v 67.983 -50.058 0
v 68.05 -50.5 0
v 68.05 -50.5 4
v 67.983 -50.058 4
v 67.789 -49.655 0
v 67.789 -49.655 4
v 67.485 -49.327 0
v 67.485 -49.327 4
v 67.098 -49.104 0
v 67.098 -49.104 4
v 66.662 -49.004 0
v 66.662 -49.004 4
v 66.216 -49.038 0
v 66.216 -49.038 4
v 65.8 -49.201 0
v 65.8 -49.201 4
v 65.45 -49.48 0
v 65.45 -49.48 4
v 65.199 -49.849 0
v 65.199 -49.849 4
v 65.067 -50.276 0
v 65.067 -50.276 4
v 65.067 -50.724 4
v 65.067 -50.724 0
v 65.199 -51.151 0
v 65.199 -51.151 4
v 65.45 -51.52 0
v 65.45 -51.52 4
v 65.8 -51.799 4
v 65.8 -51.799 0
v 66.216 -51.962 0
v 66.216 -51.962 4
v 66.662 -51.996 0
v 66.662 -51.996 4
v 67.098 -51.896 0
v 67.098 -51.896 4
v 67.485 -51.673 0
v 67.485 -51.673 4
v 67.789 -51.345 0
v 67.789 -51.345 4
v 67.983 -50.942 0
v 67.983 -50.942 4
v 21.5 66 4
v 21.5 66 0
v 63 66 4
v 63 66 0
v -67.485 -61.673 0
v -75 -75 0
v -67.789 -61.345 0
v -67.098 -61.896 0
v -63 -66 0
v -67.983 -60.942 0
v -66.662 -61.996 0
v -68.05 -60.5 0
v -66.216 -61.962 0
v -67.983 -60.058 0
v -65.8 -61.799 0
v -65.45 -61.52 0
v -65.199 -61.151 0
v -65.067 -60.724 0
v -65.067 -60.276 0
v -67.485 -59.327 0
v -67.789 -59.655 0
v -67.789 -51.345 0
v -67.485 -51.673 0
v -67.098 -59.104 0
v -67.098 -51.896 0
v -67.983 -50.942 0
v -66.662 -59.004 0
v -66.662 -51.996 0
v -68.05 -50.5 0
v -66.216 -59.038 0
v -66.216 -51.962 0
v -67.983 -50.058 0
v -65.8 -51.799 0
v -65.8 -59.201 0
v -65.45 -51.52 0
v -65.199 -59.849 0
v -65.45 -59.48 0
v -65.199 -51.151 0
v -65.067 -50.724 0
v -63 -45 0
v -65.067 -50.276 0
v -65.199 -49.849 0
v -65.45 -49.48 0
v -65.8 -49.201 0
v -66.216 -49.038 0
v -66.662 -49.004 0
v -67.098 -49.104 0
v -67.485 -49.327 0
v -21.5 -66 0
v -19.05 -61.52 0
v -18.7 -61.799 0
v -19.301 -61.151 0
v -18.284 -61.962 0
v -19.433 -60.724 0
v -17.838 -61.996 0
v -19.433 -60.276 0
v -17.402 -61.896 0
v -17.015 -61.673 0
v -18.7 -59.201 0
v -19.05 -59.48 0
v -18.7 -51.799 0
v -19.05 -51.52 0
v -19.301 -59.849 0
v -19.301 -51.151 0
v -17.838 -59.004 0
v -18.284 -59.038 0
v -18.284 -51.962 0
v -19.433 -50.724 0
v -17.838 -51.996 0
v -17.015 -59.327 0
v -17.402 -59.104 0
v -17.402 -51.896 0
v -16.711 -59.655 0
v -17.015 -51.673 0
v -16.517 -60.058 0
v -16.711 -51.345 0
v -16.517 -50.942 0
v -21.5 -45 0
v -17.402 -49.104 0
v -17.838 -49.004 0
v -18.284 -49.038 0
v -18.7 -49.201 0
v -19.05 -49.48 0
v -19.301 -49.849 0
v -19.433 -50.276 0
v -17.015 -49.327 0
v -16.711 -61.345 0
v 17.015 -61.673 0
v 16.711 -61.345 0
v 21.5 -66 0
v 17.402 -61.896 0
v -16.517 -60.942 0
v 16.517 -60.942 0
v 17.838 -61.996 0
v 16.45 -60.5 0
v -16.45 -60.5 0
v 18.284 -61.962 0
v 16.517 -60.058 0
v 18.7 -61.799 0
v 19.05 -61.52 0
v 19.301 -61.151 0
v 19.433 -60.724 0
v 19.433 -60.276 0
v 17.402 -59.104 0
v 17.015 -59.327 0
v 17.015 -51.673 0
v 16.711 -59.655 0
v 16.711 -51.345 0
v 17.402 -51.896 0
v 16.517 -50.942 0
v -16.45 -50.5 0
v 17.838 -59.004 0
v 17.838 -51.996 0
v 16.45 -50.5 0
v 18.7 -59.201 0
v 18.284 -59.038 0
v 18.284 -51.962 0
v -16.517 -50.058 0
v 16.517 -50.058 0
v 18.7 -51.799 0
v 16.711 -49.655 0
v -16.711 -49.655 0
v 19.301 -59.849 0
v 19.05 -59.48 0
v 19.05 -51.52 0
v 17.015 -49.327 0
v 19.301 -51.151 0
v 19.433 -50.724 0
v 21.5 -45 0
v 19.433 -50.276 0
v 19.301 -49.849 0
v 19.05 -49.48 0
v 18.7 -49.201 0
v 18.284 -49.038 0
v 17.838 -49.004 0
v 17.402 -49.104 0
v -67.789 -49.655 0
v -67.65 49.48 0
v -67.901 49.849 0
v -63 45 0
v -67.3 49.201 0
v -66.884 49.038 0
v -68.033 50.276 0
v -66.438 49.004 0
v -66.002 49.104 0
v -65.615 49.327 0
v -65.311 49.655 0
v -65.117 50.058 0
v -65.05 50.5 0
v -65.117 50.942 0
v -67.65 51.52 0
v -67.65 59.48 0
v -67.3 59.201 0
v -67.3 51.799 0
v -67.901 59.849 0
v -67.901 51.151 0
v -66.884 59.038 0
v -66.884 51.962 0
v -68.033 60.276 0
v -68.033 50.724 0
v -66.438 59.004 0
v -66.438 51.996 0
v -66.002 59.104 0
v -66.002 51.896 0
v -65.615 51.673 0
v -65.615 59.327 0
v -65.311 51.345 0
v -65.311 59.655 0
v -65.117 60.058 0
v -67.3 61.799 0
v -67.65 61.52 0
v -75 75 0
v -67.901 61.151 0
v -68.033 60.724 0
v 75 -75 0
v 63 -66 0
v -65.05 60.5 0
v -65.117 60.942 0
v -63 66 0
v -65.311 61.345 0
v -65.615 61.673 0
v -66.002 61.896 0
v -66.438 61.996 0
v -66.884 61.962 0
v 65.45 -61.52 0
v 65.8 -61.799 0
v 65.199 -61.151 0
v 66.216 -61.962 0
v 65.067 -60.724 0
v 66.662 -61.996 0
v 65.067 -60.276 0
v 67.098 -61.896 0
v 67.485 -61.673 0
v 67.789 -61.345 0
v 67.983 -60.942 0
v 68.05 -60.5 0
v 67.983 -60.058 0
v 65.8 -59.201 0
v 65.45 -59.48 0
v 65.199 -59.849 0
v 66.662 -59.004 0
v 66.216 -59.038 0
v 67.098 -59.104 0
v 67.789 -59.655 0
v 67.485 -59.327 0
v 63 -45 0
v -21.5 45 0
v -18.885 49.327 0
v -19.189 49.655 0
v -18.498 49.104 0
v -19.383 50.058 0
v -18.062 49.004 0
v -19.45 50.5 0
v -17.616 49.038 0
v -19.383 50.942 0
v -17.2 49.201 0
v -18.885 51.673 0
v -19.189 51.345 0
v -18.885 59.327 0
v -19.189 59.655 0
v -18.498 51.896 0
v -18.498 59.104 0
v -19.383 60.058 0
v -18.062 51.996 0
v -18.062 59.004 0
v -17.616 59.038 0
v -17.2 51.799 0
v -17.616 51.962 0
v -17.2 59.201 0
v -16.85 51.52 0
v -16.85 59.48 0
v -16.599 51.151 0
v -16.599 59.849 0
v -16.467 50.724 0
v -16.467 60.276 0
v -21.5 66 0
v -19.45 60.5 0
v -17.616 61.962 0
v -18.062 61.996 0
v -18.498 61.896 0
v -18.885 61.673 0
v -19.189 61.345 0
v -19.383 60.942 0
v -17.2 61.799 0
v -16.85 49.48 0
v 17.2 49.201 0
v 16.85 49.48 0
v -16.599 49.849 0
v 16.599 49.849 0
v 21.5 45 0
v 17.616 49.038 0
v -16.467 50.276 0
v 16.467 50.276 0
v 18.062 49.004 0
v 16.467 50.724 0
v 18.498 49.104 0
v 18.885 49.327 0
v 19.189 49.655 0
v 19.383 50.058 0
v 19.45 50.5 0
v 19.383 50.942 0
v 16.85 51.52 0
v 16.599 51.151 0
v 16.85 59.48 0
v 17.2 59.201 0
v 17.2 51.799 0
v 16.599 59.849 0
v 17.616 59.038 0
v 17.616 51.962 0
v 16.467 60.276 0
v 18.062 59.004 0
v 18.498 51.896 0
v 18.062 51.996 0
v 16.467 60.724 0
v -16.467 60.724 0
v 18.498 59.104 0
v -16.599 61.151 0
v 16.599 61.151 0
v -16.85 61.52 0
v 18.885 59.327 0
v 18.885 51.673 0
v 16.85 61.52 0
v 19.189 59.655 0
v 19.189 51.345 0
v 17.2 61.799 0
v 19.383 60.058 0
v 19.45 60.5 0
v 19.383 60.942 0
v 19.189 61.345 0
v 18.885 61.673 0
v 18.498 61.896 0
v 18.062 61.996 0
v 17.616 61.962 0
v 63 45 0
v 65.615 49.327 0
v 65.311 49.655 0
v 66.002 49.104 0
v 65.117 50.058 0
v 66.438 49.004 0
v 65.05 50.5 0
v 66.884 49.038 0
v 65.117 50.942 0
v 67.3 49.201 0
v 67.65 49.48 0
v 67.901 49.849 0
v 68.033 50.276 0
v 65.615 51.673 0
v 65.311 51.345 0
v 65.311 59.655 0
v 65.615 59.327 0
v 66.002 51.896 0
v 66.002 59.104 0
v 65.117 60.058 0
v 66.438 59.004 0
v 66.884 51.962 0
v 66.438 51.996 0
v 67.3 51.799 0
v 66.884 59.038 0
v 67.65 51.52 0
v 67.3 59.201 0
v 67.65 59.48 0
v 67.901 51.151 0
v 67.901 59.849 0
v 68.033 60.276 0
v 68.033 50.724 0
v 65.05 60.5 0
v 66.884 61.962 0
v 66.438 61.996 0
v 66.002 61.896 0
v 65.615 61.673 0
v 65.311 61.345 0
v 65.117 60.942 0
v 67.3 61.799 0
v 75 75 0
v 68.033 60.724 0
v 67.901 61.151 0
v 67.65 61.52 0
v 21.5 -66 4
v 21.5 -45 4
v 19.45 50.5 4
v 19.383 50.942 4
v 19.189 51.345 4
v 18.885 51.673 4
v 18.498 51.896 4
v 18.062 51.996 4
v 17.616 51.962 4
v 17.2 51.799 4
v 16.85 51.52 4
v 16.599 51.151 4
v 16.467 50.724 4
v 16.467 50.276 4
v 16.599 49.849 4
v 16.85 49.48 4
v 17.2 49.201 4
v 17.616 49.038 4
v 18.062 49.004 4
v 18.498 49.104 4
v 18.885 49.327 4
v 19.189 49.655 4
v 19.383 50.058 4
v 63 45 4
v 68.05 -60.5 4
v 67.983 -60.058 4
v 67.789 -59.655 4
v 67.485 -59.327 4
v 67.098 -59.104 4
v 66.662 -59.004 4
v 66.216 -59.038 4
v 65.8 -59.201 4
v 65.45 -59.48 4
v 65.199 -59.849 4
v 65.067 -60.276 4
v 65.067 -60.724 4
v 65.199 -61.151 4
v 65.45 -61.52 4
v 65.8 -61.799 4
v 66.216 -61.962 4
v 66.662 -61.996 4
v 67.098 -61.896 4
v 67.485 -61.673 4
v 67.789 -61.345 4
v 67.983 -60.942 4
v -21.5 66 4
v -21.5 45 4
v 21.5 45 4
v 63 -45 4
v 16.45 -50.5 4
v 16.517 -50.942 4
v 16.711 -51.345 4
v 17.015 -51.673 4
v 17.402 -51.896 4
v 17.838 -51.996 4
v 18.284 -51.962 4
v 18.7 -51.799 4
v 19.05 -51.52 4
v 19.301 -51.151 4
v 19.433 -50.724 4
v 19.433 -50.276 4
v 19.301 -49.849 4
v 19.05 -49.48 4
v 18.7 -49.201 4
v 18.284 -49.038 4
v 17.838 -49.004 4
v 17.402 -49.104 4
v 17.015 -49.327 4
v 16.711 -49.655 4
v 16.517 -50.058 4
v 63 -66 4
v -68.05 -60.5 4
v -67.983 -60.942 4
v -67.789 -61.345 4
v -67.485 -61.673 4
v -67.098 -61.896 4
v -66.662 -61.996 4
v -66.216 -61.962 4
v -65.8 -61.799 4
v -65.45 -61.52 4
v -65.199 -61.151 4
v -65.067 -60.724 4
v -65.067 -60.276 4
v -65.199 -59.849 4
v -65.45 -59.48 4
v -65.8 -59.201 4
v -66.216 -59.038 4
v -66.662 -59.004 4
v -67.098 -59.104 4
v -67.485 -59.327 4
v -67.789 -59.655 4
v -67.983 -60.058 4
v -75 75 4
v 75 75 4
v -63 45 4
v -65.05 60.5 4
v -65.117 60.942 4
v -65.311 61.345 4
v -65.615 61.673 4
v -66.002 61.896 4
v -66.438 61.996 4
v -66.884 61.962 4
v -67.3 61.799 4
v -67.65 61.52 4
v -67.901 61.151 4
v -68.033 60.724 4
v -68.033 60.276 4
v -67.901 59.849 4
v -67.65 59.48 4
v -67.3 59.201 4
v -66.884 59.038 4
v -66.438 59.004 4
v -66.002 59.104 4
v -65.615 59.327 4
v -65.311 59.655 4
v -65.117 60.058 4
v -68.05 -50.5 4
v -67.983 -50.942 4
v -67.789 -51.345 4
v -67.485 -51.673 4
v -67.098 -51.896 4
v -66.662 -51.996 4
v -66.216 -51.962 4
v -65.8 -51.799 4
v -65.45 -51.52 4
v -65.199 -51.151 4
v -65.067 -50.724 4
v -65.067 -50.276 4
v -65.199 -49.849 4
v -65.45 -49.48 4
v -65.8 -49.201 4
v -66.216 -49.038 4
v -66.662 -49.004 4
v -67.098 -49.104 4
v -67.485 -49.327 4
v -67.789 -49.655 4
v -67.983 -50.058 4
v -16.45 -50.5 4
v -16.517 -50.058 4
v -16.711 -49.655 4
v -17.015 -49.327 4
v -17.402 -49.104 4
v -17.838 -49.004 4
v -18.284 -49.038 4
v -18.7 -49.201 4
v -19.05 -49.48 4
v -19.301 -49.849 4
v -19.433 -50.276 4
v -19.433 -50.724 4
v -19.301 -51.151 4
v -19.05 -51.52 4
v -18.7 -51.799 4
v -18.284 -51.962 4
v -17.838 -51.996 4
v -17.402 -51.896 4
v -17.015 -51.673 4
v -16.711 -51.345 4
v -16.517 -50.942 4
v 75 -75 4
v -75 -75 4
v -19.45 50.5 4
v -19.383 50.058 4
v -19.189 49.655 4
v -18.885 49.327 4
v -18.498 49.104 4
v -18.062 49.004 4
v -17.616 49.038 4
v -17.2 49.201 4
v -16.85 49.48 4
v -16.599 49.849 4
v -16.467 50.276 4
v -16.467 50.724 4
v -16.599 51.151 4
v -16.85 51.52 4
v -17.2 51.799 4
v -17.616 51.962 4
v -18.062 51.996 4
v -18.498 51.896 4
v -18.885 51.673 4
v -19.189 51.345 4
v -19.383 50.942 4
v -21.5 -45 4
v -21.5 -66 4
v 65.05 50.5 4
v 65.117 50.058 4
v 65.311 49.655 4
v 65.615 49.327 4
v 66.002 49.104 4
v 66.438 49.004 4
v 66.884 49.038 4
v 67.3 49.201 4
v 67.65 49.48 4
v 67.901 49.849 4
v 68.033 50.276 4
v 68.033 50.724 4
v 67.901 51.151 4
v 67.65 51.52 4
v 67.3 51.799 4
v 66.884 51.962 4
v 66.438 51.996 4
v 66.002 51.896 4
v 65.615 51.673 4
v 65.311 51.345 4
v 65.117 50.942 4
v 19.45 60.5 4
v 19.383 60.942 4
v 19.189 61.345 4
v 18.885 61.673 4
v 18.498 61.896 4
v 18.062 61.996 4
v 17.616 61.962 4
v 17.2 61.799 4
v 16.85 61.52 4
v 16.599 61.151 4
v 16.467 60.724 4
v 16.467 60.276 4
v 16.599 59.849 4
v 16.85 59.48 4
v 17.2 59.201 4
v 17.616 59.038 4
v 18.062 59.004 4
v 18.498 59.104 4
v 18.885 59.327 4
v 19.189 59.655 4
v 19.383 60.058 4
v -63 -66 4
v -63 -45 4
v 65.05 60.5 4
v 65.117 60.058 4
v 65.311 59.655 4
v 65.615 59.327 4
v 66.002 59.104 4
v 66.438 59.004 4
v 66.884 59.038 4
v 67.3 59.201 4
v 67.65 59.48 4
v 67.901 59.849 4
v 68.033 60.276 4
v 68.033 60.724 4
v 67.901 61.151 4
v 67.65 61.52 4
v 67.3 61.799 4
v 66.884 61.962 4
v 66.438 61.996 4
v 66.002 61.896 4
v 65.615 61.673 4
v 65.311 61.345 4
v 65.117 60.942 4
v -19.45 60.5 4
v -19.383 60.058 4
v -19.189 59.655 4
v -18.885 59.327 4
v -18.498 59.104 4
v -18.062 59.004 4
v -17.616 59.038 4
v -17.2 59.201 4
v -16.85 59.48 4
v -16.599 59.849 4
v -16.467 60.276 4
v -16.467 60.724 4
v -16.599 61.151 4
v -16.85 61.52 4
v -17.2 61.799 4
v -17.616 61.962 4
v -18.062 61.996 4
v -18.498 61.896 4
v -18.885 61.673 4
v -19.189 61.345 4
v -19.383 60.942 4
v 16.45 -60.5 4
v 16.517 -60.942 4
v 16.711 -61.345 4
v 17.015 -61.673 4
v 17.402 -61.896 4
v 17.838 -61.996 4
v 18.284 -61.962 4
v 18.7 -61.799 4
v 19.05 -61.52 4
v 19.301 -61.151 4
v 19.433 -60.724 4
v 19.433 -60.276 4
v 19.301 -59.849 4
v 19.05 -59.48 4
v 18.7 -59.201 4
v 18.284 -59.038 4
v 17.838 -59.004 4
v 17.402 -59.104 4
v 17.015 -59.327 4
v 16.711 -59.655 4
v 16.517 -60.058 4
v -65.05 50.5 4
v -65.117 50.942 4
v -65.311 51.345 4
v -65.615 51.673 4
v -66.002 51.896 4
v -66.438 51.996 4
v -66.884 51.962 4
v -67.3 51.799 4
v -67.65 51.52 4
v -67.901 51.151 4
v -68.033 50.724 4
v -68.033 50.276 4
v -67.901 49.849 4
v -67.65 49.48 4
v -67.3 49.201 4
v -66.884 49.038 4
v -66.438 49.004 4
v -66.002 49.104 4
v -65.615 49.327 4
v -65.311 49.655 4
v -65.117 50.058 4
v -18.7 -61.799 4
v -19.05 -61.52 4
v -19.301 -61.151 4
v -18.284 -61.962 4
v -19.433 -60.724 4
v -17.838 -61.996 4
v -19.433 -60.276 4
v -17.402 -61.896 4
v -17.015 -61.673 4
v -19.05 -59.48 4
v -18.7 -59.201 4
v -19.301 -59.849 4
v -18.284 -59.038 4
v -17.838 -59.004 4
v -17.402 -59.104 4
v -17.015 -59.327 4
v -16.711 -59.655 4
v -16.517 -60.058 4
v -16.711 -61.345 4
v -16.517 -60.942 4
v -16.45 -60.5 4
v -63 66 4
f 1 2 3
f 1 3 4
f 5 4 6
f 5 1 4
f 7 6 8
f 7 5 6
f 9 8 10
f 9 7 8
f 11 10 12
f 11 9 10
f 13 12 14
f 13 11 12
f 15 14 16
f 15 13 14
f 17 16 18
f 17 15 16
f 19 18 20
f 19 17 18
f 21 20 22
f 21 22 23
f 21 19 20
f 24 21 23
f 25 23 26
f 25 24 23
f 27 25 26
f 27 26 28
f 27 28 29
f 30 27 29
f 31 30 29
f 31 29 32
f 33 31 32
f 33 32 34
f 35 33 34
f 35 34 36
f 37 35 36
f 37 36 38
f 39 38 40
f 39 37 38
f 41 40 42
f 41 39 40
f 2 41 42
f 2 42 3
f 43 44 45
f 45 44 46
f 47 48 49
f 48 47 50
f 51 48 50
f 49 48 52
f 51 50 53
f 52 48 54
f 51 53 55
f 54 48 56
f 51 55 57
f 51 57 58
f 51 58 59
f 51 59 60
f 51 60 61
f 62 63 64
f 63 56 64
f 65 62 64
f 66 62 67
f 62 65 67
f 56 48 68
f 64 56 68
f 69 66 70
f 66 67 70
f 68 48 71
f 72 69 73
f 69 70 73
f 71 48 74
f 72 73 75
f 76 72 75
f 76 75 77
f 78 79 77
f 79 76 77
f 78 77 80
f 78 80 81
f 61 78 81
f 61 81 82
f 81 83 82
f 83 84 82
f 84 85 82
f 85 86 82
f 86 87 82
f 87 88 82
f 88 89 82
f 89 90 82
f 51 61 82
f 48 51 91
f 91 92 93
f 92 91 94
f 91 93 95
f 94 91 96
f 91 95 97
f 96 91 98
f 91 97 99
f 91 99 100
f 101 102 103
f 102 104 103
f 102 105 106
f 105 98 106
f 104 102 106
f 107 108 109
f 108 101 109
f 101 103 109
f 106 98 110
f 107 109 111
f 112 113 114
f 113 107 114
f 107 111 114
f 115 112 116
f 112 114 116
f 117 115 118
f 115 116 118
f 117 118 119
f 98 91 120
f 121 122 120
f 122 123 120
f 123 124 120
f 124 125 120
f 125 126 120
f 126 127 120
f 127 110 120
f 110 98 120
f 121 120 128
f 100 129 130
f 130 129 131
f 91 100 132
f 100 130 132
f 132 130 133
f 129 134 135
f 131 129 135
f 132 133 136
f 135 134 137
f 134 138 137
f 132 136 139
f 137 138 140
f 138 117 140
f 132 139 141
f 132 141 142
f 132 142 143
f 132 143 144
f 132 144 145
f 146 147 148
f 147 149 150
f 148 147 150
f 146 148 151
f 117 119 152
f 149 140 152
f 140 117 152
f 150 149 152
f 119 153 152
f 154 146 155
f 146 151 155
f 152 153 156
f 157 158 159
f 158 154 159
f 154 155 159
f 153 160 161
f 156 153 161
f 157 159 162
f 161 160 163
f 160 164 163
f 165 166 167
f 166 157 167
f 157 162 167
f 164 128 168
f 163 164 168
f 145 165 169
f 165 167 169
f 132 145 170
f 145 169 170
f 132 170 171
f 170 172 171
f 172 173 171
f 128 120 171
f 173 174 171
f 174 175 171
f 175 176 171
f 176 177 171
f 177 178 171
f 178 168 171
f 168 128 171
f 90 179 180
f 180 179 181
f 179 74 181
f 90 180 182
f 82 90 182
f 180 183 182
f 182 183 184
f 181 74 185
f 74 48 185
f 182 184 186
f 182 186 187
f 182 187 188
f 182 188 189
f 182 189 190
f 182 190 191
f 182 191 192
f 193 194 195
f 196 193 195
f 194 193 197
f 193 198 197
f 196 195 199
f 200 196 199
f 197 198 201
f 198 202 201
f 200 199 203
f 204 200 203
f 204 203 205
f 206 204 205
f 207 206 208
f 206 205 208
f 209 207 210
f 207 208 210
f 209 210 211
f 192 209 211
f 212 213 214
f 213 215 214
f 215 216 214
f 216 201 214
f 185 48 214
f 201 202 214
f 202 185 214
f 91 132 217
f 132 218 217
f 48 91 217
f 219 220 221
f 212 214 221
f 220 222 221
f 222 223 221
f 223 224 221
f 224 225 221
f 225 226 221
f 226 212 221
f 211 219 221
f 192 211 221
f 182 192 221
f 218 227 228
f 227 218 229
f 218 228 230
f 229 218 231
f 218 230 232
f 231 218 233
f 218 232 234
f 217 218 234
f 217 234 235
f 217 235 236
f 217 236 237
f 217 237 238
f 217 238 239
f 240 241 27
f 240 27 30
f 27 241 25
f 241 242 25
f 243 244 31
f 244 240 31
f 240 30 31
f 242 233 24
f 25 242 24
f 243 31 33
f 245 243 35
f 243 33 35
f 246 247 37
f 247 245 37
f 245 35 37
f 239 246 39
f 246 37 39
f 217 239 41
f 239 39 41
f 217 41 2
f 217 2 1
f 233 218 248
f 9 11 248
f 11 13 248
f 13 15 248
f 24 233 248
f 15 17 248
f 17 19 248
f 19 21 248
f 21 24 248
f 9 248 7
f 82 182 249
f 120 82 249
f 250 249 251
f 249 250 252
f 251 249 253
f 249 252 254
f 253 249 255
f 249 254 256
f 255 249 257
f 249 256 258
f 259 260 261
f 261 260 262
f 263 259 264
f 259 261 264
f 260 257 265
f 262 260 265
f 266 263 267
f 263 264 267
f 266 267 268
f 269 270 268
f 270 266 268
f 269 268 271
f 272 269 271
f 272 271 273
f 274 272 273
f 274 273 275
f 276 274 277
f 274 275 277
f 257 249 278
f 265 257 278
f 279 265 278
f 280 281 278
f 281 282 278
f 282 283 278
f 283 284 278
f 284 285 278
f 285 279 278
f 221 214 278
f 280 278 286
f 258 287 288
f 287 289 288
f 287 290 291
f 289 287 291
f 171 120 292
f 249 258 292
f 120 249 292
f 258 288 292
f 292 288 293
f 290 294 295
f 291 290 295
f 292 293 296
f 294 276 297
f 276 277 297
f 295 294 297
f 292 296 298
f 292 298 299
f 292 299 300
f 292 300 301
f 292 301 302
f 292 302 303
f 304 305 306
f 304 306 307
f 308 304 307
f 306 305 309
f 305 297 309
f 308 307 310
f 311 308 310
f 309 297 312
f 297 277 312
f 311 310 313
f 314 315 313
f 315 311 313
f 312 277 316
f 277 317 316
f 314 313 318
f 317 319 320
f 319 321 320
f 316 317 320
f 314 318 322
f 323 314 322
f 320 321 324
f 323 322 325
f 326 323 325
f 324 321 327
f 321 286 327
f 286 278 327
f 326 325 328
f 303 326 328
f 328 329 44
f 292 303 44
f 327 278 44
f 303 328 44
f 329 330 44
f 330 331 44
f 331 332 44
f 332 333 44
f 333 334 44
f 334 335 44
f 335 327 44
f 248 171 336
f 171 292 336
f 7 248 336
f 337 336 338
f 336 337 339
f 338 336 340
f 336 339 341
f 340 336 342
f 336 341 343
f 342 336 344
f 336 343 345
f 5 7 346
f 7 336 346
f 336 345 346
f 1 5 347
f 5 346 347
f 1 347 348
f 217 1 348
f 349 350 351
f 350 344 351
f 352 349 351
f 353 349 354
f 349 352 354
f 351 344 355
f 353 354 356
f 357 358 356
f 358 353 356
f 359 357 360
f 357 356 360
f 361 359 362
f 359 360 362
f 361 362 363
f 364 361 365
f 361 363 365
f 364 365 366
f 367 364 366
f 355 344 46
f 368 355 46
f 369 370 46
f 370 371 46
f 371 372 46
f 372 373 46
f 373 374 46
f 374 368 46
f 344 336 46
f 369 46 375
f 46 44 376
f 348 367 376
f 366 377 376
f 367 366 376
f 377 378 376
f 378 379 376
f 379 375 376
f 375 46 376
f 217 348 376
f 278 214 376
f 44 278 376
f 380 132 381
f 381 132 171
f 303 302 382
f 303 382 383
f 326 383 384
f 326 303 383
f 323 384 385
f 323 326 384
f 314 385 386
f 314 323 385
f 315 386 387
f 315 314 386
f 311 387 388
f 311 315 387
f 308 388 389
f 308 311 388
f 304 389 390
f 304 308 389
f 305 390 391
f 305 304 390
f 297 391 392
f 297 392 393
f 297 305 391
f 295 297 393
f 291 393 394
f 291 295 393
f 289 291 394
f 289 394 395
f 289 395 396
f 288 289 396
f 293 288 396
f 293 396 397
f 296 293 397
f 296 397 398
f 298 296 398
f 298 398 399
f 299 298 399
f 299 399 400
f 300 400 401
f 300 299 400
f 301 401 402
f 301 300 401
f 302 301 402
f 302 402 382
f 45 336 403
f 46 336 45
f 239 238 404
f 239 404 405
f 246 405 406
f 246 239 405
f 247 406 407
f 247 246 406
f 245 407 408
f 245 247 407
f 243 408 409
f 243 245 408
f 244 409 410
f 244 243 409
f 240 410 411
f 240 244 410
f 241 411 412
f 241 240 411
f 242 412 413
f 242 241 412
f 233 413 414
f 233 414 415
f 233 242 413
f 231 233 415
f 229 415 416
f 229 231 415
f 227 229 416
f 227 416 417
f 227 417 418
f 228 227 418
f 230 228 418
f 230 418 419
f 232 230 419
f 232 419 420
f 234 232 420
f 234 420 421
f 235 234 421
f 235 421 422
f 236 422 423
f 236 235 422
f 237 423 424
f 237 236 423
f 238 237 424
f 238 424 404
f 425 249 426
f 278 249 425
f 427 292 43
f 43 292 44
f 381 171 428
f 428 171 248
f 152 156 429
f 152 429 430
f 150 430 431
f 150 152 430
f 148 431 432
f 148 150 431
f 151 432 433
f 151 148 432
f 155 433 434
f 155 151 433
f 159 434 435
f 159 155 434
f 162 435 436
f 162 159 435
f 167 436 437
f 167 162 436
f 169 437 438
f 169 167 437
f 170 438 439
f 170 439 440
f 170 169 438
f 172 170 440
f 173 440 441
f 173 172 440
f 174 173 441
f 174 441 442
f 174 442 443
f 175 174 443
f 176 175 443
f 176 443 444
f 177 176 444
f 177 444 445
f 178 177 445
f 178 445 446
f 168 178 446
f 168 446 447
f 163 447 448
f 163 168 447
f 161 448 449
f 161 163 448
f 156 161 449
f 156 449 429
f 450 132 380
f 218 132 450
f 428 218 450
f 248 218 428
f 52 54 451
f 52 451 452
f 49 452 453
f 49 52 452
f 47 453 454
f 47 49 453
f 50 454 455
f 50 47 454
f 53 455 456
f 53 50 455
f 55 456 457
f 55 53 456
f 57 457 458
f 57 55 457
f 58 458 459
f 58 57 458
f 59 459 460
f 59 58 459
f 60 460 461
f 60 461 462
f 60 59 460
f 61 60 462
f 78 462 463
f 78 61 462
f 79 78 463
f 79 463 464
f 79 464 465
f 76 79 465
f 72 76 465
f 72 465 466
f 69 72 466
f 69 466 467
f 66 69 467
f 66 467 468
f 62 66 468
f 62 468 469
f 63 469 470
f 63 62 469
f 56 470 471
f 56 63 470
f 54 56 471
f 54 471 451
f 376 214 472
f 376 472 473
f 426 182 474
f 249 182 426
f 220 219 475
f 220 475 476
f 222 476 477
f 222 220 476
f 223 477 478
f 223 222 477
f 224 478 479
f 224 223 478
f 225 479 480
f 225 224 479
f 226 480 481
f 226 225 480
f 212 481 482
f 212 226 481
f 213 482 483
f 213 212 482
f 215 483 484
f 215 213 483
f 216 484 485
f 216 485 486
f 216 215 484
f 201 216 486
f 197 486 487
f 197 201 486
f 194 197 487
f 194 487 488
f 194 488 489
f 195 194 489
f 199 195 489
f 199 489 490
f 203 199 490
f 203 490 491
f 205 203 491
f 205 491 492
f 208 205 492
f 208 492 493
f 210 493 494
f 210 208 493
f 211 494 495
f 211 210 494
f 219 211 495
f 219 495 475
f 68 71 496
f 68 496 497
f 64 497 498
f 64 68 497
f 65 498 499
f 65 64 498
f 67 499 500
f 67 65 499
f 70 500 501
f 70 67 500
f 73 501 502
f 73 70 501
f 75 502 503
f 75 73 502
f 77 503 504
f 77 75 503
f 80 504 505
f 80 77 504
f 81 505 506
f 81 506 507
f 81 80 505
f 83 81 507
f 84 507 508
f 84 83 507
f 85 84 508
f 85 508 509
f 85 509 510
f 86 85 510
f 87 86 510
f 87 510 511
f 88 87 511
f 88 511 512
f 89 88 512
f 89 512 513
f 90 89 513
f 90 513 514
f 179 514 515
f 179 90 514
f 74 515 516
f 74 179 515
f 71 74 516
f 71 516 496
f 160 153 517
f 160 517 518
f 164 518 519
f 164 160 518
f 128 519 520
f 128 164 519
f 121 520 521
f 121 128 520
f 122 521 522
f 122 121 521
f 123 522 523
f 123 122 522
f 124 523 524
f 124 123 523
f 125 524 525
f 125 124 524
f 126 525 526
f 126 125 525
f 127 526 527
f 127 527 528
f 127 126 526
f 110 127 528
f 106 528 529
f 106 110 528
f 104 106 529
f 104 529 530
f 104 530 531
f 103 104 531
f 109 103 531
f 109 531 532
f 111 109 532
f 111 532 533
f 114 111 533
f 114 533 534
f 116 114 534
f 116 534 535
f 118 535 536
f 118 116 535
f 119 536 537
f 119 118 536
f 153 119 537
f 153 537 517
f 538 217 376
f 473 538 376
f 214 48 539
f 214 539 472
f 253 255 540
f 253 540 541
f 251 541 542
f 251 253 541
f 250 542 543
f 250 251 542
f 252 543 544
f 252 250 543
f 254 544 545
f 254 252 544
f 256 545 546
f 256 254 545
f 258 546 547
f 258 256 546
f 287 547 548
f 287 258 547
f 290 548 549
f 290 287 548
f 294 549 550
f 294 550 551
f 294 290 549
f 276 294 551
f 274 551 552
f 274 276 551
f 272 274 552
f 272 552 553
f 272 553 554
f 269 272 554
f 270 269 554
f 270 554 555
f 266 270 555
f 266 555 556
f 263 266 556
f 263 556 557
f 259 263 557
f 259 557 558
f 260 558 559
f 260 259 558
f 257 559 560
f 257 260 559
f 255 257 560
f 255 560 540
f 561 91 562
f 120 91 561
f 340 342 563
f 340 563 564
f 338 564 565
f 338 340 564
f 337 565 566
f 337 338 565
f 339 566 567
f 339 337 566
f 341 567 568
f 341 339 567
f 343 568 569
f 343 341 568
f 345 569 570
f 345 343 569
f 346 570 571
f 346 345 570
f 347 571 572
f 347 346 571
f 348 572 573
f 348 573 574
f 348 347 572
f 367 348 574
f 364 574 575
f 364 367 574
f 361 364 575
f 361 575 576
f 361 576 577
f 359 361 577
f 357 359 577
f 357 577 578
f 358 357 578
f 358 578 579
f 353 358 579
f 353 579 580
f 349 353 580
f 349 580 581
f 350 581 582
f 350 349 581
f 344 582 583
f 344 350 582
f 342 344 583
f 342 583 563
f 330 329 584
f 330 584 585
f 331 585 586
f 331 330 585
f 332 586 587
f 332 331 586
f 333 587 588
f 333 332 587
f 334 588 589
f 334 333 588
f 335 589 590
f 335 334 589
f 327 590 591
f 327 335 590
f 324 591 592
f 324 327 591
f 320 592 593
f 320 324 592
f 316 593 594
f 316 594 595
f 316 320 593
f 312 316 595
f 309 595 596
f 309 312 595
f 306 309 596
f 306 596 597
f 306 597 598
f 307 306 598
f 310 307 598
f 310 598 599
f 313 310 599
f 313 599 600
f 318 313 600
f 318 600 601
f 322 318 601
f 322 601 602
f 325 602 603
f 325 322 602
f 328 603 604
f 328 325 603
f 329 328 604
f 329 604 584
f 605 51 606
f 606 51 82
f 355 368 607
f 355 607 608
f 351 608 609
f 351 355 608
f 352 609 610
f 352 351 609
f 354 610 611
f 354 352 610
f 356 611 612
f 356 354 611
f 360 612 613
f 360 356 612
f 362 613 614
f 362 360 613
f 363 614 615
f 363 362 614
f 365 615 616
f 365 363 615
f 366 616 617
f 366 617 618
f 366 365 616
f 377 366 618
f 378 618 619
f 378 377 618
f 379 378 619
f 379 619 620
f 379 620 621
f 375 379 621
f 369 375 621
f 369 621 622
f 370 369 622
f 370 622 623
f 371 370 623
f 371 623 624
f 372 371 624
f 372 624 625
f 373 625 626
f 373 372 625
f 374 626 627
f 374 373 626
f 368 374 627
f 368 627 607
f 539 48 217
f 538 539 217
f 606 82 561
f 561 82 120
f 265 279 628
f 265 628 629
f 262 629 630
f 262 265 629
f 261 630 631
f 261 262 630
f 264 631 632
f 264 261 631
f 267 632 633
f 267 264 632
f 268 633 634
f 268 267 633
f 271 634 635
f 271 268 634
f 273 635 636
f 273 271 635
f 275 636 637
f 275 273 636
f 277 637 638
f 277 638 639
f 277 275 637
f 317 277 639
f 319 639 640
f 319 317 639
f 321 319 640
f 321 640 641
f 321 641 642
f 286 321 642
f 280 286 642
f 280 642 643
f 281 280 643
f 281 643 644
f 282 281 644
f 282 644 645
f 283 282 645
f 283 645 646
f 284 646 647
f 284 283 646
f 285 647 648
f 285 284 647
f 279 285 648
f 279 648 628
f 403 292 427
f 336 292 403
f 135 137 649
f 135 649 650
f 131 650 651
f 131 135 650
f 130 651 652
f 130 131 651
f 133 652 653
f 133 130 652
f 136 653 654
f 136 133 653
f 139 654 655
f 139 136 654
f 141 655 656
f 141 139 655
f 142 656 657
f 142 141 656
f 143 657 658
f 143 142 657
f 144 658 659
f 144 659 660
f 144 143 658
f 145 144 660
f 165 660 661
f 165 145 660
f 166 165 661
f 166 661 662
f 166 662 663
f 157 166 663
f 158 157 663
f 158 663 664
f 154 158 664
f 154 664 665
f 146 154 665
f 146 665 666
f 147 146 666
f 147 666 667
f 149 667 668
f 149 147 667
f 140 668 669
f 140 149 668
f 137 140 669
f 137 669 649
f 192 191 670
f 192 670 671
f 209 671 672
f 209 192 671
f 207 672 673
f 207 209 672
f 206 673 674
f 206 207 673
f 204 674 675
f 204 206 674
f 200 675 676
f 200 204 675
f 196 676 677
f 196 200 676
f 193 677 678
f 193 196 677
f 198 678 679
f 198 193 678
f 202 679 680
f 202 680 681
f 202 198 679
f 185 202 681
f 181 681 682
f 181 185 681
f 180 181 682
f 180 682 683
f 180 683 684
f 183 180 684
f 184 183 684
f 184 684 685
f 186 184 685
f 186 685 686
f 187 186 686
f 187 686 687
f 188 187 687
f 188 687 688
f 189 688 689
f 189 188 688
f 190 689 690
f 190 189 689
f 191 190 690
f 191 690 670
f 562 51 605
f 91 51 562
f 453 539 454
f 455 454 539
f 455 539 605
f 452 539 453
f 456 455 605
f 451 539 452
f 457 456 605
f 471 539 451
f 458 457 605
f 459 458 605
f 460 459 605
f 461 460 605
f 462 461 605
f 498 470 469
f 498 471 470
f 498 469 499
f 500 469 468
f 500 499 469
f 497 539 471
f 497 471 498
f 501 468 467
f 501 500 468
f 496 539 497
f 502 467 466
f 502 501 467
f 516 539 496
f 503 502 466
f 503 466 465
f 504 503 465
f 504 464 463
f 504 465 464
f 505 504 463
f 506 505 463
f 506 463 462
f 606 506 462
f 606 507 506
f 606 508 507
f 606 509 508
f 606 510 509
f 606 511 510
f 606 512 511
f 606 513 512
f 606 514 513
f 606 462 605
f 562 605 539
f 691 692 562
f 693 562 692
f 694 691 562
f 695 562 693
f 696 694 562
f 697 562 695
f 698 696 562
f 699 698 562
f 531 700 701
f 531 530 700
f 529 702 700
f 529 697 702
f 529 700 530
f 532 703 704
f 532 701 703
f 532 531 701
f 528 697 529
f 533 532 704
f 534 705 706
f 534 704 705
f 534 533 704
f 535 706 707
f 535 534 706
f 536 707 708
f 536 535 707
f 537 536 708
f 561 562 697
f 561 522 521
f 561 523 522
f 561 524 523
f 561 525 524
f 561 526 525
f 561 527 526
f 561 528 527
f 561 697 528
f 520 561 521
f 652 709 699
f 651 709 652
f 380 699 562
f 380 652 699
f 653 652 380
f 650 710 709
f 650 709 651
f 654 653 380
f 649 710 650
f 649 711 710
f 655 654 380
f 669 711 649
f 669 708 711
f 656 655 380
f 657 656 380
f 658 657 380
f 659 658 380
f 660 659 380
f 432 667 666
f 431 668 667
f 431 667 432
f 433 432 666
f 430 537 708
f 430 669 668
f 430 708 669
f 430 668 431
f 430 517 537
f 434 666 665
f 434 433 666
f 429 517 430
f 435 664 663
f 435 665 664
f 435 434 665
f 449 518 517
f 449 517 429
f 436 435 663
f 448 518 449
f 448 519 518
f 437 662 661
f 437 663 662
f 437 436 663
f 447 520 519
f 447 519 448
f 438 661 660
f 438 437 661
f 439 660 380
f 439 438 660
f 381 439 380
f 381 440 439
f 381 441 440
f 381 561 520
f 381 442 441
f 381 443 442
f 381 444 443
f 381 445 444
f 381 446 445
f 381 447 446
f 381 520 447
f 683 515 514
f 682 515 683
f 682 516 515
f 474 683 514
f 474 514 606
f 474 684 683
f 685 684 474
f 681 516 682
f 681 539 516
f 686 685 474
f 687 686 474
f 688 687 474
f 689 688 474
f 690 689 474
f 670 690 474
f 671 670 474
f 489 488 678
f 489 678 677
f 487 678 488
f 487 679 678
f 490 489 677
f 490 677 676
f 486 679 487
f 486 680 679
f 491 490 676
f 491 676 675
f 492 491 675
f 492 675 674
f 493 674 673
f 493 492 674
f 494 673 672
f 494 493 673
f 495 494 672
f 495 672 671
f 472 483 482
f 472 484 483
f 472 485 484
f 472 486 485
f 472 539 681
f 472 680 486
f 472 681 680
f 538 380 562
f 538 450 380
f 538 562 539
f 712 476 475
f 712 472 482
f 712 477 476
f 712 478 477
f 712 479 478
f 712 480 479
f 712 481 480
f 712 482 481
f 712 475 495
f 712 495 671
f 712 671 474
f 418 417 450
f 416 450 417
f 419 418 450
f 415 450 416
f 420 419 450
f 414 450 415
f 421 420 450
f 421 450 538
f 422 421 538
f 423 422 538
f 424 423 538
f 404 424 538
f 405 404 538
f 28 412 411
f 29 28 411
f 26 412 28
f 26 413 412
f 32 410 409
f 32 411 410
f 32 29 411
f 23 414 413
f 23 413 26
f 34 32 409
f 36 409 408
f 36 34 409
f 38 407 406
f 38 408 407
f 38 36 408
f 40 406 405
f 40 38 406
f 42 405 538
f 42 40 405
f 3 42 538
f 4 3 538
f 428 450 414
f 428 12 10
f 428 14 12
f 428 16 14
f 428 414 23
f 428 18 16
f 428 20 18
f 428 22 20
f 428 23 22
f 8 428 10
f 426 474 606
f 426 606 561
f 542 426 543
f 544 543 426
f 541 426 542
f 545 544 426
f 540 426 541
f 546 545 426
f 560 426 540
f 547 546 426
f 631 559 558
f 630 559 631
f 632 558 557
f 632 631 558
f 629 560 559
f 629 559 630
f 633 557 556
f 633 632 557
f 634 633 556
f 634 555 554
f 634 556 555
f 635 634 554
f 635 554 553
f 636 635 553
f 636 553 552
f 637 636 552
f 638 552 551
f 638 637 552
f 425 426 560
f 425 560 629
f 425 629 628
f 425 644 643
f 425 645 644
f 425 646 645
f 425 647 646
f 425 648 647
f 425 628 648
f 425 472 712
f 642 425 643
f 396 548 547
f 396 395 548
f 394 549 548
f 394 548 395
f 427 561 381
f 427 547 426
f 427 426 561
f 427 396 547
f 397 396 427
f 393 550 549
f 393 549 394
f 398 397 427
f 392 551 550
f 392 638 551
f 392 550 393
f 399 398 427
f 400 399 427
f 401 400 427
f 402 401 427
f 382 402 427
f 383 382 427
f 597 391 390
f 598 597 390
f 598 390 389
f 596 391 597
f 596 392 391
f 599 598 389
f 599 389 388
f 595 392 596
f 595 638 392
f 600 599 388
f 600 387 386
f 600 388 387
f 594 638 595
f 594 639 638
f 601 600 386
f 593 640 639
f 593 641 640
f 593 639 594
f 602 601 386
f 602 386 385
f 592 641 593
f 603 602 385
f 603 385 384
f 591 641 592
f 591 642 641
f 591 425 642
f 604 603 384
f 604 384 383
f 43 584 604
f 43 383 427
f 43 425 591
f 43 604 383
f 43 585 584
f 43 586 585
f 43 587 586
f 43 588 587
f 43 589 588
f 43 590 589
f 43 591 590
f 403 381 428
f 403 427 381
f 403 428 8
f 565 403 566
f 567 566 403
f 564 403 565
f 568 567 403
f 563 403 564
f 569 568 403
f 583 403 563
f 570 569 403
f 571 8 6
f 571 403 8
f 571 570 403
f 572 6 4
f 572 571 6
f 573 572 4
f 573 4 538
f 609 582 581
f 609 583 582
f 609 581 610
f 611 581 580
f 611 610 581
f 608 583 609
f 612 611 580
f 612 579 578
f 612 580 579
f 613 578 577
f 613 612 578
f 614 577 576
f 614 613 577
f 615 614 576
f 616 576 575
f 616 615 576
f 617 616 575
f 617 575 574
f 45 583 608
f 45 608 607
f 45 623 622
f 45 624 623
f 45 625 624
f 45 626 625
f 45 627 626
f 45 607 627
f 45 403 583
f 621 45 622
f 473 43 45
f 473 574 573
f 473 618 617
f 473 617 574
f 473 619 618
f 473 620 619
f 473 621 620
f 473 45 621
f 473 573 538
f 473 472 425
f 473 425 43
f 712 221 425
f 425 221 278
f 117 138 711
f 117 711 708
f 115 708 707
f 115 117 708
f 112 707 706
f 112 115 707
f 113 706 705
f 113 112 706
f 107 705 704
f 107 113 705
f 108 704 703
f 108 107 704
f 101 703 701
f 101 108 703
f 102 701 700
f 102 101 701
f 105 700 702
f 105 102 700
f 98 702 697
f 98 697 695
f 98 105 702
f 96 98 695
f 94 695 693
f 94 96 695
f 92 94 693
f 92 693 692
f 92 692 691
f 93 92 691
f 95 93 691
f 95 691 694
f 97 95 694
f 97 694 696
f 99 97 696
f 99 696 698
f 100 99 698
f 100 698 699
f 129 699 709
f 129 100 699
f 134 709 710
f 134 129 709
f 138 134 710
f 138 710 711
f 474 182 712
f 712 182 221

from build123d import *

# Parameters (mm, degrees)
ESBO_O1_W                = 150
ESBO_O1_H                = 150
ESBO_O1_R                = 1.5
ESBO_O1_W_2              = 41.5
ESBO_O1_H_2              = 21
RESSALTO_EXTRUS_O1_DEPTH = 4


with BuildPart() as part:
    # Esboço1 → Ressalto-extrusão1 (new body)
    with BuildSketch(Plane.XY):
        Rectangle(ESBO_O1_W, ESBO_O1_H)
        with Locations((-66.55, 60.5)):
            Circle(ESBO_O1_R, mode=Mode.SUBTRACT)
        with Locations((-66.55, 50.5)):
            Circle(ESBO_O1_R, mode=Mode.SUBTRACT)
        with Locations(Location((-17.95, 60.5, 0), (0, 0, 180))):
            Circle(ESBO_O1_R, mode=Mode.SUBTRACT)
        with Locations(Location((-17.95, 50.5, 0), (0, 0, 180))):
            Circle(ESBO_O1_R, mode=Mode.SUBTRACT)
        with Locations((17.95, 50.5)):
            Circle(ESBO_O1_R, mode=Mode.SUBTRACT)
        with Locations((17.95, 60.5)):
            Circle(ESBO_O1_R, mode=Mode.SUBTRACT)
        with Locations(Location((66.55, 50.5, 0), (0, 0, 180))):
            Circle(ESBO_O1_R, mode=Mode.SUBTRACT)
        with Locations(Location((66.55, 60.5, 0), (0, 0, 180))):
            Circle(ESBO_O1_R, mode=Mode.SUBTRACT)
        with Locations((66.55, -60.5)):
            Circle(ESBO_O1_R, mode=Mode.SUBTRACT)
        with Locations((66.55, -50.5)):
            Circle(ESBO_O1_R, mode=Mode.SUBTRACT)
        with Locations(Location((17.95, -60.5, 0), (0, 0, 180))):
            Circle(ESBO_O1_R, mode=Mode.SUBTRACT)
        with Locations(Location((17.95, -50.5, 0), (0, 0, 180))):
            Circle(ESBO_O1_R, mode=Mode.SUBTRACT)
        with Locations((-17.95, -50.5)):
            Circle(ESBO_O1_R, mode=Mode.SUBTRACT)
        with Locations((-17.95, -60.5)):
            Circle(ESBO_O1_R, mode=Mode.SUBTRACT)
        with Locations(Location((-66.55, -50.5, 0), (0, 0, 180))):
            Circle(ESBO_O1_R, mode=Mode.SUBTRACT)
        with Locations(Location((-66.55, -60.5, 0), (0, 0, 180))):
            Circle(ESBO_O1_R, mode=Mode.SUBTRACT)
        with Locations((-42.25, 55.5)):
            Rectangle(ESBO_O1_W_2, ESBO_O1_H_2, mode=Mode.SUBTRACT)
        with Locations((42.25, 55.5)):
            Rectangle(ESBO_O1_W_2, ESBO_O1_H_2, mode=Mode.SUBTRACT)
        with Locations((42.25, -55.5)):
            Rectangle(ESBO_O1_W_2, ESBO_O1_H_2, mode=Mode.SUBTRACT)
        with Locations((-42.25, -55.5)):
            Rectangle(ESBO_O1_W_2, ESBO_O1_H_2, mode=Mode.SUBTRACT)
    extrude(amount=RESSALTO_EXTRUS_O1_DEPTH)


solid = part.part
